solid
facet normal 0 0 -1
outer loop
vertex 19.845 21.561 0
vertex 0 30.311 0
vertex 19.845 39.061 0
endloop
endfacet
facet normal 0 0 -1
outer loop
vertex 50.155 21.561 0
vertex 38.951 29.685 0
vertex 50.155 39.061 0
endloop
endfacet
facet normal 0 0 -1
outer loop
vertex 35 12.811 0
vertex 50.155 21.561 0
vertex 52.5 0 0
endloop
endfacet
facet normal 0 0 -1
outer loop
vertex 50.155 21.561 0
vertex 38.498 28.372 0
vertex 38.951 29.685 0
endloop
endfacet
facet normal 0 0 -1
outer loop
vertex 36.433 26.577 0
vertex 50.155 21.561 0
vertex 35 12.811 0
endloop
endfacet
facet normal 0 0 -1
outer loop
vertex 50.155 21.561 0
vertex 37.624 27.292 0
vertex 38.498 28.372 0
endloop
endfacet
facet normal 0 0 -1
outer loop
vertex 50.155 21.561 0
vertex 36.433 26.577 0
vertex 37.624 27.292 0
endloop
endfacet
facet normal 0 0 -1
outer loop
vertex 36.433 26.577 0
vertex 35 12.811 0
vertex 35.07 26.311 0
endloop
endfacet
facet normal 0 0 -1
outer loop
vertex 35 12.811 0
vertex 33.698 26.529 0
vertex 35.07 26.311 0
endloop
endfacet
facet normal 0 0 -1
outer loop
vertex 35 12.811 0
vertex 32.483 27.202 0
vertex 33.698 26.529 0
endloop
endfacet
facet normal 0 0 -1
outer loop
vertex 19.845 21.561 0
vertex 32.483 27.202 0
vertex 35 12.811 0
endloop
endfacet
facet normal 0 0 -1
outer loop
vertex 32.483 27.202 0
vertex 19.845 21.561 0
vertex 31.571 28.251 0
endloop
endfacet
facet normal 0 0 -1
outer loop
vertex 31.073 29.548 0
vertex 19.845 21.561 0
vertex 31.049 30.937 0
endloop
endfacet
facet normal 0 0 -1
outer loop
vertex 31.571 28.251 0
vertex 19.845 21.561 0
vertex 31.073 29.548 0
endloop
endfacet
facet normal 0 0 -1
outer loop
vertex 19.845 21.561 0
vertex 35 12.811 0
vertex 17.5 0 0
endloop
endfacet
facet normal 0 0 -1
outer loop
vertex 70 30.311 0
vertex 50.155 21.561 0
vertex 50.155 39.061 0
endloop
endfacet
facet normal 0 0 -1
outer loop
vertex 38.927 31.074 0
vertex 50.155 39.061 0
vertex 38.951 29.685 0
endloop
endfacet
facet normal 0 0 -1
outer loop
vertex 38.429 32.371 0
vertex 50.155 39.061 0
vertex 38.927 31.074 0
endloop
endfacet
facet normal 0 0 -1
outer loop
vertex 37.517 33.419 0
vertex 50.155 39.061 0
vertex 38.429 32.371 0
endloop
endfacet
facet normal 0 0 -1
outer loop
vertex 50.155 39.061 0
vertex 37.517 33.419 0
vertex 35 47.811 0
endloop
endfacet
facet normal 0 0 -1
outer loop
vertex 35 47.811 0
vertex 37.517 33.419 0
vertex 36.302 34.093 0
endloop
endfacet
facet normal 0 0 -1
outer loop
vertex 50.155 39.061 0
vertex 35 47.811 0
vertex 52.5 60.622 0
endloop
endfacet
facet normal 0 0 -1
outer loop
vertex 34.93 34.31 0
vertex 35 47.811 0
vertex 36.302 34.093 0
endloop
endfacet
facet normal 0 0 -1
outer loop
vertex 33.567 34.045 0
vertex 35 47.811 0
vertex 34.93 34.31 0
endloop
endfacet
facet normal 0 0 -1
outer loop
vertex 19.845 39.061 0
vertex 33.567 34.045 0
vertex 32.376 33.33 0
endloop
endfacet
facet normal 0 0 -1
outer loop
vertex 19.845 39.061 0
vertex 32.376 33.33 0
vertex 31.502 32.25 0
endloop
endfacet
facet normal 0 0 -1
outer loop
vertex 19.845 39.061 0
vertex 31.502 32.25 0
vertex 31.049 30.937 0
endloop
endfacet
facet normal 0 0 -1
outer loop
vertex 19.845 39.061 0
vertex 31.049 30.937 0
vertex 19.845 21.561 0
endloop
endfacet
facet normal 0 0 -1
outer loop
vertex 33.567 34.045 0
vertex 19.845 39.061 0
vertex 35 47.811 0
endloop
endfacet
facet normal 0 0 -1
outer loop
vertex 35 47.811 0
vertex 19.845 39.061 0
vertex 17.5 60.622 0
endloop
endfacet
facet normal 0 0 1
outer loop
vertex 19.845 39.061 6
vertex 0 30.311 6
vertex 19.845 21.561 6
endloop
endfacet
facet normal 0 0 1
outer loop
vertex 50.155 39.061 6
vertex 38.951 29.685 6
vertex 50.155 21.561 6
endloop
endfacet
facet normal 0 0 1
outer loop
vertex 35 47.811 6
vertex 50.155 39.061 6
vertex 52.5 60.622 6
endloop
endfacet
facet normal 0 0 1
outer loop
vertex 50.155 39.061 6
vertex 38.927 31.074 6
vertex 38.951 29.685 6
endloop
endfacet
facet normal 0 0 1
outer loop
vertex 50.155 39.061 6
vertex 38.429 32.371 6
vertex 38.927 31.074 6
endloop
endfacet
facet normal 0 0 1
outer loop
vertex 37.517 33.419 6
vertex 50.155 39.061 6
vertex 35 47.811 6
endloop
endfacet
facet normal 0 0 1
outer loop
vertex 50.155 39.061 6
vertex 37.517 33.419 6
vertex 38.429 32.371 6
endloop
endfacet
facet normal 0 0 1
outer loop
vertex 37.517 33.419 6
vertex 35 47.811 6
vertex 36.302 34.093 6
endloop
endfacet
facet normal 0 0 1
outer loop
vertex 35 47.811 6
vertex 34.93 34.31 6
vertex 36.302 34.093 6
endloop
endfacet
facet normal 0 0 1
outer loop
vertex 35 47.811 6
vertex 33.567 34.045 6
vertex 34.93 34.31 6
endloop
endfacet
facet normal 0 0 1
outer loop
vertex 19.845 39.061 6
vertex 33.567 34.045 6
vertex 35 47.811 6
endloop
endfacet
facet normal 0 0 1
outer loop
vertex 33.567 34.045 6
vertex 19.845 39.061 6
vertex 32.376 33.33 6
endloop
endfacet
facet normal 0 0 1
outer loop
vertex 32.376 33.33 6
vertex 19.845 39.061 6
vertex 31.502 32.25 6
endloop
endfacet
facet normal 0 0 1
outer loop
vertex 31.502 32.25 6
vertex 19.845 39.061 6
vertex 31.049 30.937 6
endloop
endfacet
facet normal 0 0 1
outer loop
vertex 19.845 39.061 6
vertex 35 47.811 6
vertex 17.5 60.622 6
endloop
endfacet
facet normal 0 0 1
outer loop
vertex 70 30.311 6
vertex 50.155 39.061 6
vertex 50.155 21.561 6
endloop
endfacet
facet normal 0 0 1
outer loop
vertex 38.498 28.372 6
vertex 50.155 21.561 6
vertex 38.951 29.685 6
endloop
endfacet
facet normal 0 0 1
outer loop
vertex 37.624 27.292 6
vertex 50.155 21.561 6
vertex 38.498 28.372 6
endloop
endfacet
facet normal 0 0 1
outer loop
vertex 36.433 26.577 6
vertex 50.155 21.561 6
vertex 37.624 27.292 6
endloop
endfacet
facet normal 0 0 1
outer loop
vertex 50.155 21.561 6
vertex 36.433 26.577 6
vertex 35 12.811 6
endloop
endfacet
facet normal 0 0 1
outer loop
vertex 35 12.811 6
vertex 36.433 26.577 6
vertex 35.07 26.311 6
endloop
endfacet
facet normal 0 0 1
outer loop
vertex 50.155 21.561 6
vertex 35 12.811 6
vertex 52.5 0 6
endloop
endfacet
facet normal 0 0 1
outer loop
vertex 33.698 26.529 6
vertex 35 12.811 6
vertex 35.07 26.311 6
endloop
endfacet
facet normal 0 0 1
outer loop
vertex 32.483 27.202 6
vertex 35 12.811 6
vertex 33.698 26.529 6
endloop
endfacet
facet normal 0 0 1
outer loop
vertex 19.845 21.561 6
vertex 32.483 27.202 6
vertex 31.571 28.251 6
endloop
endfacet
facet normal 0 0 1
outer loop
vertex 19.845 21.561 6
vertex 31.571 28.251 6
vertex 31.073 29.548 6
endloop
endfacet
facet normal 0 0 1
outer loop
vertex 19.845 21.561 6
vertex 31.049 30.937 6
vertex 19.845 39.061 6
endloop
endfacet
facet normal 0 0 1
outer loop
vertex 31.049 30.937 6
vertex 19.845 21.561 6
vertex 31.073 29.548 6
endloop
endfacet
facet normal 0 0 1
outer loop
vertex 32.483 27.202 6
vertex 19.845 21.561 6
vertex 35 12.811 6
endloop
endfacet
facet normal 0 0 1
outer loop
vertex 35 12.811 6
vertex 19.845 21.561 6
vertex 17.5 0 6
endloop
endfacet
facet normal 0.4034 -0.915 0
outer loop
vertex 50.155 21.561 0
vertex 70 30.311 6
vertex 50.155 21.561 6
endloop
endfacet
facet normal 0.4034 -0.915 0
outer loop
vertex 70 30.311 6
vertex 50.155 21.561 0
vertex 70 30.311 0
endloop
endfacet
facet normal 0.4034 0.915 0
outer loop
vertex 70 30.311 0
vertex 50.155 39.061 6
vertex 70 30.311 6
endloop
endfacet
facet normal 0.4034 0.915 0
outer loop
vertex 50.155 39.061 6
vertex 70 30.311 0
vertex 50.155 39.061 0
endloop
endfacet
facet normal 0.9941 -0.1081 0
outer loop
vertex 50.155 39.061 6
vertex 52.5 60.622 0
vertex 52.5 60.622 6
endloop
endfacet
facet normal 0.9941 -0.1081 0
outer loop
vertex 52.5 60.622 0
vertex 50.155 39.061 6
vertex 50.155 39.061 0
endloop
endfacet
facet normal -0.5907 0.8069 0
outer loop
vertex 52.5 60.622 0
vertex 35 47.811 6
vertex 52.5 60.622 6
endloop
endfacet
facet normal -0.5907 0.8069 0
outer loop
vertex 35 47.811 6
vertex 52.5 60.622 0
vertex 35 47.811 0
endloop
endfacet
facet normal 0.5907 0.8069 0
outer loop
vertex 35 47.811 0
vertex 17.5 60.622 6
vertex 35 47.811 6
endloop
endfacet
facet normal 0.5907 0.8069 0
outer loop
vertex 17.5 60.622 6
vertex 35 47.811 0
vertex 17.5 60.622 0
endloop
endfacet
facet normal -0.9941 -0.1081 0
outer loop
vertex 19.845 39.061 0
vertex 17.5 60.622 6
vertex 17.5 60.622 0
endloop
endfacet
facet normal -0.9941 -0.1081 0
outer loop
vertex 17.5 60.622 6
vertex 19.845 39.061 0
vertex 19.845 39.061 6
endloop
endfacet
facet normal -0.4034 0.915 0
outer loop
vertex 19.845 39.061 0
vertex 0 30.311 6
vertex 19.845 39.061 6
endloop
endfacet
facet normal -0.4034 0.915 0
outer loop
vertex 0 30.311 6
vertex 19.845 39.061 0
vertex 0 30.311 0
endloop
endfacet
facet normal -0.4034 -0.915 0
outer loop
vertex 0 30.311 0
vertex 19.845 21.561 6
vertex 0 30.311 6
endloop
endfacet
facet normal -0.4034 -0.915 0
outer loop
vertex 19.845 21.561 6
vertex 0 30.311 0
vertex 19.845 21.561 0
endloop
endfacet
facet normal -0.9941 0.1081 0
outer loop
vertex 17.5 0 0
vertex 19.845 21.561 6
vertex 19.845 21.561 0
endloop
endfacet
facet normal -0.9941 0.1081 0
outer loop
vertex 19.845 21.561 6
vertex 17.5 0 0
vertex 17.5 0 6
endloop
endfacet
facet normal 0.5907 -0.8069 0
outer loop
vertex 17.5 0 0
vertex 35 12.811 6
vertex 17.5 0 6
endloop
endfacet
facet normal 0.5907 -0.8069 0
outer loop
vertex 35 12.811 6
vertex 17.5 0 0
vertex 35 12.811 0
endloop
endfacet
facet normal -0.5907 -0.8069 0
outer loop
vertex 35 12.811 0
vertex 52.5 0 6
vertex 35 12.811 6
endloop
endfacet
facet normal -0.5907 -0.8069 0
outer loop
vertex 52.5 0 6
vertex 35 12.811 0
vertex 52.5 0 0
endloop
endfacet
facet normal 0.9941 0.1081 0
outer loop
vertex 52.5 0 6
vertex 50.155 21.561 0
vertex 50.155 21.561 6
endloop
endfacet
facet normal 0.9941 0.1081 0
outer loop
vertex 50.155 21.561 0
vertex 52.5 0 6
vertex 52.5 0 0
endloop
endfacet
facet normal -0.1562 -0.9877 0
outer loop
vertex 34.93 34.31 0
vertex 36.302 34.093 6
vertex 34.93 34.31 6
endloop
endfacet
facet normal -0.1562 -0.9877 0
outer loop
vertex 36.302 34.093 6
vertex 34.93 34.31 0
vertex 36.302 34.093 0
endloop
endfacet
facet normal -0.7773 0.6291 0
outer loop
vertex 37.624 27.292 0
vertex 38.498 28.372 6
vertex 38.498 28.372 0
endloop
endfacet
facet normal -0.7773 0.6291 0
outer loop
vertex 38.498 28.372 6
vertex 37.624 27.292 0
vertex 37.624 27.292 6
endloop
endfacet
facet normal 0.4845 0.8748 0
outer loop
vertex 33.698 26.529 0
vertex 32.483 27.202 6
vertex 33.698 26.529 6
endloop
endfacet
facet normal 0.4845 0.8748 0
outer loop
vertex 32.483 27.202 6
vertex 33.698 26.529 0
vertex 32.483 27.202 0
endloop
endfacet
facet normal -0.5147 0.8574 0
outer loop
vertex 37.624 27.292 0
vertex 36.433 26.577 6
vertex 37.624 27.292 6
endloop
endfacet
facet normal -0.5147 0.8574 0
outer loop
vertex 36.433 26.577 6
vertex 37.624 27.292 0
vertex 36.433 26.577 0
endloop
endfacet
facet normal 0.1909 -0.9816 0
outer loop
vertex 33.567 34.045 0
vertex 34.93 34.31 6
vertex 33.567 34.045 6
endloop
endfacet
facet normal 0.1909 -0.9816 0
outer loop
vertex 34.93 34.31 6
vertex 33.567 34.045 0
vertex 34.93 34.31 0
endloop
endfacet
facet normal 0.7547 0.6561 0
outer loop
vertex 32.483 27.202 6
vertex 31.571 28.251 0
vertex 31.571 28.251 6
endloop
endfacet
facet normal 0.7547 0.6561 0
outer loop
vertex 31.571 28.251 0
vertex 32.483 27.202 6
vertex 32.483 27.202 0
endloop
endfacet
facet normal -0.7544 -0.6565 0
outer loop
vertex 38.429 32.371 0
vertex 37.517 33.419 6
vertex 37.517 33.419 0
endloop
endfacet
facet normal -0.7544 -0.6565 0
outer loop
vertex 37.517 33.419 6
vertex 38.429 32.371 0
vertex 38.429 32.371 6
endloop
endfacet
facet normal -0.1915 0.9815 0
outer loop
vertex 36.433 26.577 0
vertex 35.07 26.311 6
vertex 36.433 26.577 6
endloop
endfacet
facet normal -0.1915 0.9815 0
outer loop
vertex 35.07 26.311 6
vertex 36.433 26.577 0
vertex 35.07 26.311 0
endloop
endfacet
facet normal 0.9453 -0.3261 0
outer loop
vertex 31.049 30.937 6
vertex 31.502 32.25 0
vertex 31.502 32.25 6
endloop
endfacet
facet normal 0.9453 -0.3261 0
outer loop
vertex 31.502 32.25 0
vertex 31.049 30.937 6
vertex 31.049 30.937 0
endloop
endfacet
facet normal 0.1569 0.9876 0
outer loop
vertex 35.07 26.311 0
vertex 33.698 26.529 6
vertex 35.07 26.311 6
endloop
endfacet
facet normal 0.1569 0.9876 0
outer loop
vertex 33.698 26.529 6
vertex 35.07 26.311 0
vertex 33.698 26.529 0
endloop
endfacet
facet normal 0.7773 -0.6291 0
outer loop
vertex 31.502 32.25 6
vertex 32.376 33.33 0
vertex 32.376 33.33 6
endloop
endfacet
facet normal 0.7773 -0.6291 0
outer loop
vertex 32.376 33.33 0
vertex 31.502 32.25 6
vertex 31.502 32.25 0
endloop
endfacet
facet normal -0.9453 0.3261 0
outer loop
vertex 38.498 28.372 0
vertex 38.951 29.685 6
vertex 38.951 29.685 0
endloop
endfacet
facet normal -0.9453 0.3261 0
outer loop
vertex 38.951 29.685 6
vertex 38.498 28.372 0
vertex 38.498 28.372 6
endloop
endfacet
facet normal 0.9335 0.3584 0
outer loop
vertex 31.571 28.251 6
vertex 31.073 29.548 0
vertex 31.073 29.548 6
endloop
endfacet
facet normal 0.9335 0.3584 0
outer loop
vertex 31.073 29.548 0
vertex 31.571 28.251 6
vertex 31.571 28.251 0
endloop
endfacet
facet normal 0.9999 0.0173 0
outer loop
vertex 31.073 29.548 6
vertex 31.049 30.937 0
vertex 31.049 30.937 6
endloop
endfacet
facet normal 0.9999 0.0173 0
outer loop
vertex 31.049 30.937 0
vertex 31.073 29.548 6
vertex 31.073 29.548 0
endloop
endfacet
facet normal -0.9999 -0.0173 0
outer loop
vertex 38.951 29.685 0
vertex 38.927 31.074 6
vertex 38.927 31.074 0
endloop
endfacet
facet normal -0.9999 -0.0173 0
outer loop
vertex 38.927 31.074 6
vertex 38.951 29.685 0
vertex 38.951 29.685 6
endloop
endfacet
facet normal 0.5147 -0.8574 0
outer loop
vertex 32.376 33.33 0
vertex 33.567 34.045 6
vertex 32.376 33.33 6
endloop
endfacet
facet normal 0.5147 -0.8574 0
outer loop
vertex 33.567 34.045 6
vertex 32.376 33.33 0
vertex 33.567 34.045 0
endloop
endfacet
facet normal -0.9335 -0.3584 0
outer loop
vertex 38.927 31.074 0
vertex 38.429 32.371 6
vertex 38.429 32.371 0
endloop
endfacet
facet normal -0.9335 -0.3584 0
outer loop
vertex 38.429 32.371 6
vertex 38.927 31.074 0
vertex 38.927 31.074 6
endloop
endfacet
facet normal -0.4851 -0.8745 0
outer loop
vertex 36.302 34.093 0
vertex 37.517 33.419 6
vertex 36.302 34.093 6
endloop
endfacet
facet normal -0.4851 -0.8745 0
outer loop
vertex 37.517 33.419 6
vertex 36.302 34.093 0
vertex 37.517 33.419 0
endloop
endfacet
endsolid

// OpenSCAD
$fn = 32;

// ----------------------------------------------------------------------
// Star wheel: 6-point star, R35
// ----------------------------------------------------------------------

// --- parameters (mm) ---
n_points = 6;             // number of points / teeth
r_out = 35;               // tip radius
r_in = 17.5;              // root radius
bore_r = 4;               // centre bore radius
plate_t = 6;              // plate thickness, Z (extrusion height)
bore_d = 8;               // centre bore diameter

profile = [[70, 30.311], [50.155, 39.061], [52.5, 60.622], [35, 47.811], [17.5, 60.622], [19.845, 39.061], [0, 30.311], [19.845, 21.561], [17.5, 0], [35, 12.811], [52.5, 0], [50.155, 21.561]];  // primary outline, 12 points, counter clockwise
void_1 = [[38.927, 31.074], [38.429, 32.371], [37.517, 33.419], [36.302, 34.093], [34.93, 34.31], [33.567, 34.045], [32.376, 33.33], [31.502, 32.25], [31.049, 30.937], [31.073, 29.548], [31.571, 28.251], [32.483, 27.202], [33.698, 26.529], [35.07, 26.311], [36.433, 26.577], [37.624, 27.292], [38.498, 28.372], [38.951, 29.685]];  // centre bore, 18 points

// --- the one profile operation ---
difference() {
  linear_extrude(height = plate_t) polygon(points = profile);
  translate([0, 0, -1])
    linear_extrude(height = plate_t + 2) polygon(points = void_1);
}
